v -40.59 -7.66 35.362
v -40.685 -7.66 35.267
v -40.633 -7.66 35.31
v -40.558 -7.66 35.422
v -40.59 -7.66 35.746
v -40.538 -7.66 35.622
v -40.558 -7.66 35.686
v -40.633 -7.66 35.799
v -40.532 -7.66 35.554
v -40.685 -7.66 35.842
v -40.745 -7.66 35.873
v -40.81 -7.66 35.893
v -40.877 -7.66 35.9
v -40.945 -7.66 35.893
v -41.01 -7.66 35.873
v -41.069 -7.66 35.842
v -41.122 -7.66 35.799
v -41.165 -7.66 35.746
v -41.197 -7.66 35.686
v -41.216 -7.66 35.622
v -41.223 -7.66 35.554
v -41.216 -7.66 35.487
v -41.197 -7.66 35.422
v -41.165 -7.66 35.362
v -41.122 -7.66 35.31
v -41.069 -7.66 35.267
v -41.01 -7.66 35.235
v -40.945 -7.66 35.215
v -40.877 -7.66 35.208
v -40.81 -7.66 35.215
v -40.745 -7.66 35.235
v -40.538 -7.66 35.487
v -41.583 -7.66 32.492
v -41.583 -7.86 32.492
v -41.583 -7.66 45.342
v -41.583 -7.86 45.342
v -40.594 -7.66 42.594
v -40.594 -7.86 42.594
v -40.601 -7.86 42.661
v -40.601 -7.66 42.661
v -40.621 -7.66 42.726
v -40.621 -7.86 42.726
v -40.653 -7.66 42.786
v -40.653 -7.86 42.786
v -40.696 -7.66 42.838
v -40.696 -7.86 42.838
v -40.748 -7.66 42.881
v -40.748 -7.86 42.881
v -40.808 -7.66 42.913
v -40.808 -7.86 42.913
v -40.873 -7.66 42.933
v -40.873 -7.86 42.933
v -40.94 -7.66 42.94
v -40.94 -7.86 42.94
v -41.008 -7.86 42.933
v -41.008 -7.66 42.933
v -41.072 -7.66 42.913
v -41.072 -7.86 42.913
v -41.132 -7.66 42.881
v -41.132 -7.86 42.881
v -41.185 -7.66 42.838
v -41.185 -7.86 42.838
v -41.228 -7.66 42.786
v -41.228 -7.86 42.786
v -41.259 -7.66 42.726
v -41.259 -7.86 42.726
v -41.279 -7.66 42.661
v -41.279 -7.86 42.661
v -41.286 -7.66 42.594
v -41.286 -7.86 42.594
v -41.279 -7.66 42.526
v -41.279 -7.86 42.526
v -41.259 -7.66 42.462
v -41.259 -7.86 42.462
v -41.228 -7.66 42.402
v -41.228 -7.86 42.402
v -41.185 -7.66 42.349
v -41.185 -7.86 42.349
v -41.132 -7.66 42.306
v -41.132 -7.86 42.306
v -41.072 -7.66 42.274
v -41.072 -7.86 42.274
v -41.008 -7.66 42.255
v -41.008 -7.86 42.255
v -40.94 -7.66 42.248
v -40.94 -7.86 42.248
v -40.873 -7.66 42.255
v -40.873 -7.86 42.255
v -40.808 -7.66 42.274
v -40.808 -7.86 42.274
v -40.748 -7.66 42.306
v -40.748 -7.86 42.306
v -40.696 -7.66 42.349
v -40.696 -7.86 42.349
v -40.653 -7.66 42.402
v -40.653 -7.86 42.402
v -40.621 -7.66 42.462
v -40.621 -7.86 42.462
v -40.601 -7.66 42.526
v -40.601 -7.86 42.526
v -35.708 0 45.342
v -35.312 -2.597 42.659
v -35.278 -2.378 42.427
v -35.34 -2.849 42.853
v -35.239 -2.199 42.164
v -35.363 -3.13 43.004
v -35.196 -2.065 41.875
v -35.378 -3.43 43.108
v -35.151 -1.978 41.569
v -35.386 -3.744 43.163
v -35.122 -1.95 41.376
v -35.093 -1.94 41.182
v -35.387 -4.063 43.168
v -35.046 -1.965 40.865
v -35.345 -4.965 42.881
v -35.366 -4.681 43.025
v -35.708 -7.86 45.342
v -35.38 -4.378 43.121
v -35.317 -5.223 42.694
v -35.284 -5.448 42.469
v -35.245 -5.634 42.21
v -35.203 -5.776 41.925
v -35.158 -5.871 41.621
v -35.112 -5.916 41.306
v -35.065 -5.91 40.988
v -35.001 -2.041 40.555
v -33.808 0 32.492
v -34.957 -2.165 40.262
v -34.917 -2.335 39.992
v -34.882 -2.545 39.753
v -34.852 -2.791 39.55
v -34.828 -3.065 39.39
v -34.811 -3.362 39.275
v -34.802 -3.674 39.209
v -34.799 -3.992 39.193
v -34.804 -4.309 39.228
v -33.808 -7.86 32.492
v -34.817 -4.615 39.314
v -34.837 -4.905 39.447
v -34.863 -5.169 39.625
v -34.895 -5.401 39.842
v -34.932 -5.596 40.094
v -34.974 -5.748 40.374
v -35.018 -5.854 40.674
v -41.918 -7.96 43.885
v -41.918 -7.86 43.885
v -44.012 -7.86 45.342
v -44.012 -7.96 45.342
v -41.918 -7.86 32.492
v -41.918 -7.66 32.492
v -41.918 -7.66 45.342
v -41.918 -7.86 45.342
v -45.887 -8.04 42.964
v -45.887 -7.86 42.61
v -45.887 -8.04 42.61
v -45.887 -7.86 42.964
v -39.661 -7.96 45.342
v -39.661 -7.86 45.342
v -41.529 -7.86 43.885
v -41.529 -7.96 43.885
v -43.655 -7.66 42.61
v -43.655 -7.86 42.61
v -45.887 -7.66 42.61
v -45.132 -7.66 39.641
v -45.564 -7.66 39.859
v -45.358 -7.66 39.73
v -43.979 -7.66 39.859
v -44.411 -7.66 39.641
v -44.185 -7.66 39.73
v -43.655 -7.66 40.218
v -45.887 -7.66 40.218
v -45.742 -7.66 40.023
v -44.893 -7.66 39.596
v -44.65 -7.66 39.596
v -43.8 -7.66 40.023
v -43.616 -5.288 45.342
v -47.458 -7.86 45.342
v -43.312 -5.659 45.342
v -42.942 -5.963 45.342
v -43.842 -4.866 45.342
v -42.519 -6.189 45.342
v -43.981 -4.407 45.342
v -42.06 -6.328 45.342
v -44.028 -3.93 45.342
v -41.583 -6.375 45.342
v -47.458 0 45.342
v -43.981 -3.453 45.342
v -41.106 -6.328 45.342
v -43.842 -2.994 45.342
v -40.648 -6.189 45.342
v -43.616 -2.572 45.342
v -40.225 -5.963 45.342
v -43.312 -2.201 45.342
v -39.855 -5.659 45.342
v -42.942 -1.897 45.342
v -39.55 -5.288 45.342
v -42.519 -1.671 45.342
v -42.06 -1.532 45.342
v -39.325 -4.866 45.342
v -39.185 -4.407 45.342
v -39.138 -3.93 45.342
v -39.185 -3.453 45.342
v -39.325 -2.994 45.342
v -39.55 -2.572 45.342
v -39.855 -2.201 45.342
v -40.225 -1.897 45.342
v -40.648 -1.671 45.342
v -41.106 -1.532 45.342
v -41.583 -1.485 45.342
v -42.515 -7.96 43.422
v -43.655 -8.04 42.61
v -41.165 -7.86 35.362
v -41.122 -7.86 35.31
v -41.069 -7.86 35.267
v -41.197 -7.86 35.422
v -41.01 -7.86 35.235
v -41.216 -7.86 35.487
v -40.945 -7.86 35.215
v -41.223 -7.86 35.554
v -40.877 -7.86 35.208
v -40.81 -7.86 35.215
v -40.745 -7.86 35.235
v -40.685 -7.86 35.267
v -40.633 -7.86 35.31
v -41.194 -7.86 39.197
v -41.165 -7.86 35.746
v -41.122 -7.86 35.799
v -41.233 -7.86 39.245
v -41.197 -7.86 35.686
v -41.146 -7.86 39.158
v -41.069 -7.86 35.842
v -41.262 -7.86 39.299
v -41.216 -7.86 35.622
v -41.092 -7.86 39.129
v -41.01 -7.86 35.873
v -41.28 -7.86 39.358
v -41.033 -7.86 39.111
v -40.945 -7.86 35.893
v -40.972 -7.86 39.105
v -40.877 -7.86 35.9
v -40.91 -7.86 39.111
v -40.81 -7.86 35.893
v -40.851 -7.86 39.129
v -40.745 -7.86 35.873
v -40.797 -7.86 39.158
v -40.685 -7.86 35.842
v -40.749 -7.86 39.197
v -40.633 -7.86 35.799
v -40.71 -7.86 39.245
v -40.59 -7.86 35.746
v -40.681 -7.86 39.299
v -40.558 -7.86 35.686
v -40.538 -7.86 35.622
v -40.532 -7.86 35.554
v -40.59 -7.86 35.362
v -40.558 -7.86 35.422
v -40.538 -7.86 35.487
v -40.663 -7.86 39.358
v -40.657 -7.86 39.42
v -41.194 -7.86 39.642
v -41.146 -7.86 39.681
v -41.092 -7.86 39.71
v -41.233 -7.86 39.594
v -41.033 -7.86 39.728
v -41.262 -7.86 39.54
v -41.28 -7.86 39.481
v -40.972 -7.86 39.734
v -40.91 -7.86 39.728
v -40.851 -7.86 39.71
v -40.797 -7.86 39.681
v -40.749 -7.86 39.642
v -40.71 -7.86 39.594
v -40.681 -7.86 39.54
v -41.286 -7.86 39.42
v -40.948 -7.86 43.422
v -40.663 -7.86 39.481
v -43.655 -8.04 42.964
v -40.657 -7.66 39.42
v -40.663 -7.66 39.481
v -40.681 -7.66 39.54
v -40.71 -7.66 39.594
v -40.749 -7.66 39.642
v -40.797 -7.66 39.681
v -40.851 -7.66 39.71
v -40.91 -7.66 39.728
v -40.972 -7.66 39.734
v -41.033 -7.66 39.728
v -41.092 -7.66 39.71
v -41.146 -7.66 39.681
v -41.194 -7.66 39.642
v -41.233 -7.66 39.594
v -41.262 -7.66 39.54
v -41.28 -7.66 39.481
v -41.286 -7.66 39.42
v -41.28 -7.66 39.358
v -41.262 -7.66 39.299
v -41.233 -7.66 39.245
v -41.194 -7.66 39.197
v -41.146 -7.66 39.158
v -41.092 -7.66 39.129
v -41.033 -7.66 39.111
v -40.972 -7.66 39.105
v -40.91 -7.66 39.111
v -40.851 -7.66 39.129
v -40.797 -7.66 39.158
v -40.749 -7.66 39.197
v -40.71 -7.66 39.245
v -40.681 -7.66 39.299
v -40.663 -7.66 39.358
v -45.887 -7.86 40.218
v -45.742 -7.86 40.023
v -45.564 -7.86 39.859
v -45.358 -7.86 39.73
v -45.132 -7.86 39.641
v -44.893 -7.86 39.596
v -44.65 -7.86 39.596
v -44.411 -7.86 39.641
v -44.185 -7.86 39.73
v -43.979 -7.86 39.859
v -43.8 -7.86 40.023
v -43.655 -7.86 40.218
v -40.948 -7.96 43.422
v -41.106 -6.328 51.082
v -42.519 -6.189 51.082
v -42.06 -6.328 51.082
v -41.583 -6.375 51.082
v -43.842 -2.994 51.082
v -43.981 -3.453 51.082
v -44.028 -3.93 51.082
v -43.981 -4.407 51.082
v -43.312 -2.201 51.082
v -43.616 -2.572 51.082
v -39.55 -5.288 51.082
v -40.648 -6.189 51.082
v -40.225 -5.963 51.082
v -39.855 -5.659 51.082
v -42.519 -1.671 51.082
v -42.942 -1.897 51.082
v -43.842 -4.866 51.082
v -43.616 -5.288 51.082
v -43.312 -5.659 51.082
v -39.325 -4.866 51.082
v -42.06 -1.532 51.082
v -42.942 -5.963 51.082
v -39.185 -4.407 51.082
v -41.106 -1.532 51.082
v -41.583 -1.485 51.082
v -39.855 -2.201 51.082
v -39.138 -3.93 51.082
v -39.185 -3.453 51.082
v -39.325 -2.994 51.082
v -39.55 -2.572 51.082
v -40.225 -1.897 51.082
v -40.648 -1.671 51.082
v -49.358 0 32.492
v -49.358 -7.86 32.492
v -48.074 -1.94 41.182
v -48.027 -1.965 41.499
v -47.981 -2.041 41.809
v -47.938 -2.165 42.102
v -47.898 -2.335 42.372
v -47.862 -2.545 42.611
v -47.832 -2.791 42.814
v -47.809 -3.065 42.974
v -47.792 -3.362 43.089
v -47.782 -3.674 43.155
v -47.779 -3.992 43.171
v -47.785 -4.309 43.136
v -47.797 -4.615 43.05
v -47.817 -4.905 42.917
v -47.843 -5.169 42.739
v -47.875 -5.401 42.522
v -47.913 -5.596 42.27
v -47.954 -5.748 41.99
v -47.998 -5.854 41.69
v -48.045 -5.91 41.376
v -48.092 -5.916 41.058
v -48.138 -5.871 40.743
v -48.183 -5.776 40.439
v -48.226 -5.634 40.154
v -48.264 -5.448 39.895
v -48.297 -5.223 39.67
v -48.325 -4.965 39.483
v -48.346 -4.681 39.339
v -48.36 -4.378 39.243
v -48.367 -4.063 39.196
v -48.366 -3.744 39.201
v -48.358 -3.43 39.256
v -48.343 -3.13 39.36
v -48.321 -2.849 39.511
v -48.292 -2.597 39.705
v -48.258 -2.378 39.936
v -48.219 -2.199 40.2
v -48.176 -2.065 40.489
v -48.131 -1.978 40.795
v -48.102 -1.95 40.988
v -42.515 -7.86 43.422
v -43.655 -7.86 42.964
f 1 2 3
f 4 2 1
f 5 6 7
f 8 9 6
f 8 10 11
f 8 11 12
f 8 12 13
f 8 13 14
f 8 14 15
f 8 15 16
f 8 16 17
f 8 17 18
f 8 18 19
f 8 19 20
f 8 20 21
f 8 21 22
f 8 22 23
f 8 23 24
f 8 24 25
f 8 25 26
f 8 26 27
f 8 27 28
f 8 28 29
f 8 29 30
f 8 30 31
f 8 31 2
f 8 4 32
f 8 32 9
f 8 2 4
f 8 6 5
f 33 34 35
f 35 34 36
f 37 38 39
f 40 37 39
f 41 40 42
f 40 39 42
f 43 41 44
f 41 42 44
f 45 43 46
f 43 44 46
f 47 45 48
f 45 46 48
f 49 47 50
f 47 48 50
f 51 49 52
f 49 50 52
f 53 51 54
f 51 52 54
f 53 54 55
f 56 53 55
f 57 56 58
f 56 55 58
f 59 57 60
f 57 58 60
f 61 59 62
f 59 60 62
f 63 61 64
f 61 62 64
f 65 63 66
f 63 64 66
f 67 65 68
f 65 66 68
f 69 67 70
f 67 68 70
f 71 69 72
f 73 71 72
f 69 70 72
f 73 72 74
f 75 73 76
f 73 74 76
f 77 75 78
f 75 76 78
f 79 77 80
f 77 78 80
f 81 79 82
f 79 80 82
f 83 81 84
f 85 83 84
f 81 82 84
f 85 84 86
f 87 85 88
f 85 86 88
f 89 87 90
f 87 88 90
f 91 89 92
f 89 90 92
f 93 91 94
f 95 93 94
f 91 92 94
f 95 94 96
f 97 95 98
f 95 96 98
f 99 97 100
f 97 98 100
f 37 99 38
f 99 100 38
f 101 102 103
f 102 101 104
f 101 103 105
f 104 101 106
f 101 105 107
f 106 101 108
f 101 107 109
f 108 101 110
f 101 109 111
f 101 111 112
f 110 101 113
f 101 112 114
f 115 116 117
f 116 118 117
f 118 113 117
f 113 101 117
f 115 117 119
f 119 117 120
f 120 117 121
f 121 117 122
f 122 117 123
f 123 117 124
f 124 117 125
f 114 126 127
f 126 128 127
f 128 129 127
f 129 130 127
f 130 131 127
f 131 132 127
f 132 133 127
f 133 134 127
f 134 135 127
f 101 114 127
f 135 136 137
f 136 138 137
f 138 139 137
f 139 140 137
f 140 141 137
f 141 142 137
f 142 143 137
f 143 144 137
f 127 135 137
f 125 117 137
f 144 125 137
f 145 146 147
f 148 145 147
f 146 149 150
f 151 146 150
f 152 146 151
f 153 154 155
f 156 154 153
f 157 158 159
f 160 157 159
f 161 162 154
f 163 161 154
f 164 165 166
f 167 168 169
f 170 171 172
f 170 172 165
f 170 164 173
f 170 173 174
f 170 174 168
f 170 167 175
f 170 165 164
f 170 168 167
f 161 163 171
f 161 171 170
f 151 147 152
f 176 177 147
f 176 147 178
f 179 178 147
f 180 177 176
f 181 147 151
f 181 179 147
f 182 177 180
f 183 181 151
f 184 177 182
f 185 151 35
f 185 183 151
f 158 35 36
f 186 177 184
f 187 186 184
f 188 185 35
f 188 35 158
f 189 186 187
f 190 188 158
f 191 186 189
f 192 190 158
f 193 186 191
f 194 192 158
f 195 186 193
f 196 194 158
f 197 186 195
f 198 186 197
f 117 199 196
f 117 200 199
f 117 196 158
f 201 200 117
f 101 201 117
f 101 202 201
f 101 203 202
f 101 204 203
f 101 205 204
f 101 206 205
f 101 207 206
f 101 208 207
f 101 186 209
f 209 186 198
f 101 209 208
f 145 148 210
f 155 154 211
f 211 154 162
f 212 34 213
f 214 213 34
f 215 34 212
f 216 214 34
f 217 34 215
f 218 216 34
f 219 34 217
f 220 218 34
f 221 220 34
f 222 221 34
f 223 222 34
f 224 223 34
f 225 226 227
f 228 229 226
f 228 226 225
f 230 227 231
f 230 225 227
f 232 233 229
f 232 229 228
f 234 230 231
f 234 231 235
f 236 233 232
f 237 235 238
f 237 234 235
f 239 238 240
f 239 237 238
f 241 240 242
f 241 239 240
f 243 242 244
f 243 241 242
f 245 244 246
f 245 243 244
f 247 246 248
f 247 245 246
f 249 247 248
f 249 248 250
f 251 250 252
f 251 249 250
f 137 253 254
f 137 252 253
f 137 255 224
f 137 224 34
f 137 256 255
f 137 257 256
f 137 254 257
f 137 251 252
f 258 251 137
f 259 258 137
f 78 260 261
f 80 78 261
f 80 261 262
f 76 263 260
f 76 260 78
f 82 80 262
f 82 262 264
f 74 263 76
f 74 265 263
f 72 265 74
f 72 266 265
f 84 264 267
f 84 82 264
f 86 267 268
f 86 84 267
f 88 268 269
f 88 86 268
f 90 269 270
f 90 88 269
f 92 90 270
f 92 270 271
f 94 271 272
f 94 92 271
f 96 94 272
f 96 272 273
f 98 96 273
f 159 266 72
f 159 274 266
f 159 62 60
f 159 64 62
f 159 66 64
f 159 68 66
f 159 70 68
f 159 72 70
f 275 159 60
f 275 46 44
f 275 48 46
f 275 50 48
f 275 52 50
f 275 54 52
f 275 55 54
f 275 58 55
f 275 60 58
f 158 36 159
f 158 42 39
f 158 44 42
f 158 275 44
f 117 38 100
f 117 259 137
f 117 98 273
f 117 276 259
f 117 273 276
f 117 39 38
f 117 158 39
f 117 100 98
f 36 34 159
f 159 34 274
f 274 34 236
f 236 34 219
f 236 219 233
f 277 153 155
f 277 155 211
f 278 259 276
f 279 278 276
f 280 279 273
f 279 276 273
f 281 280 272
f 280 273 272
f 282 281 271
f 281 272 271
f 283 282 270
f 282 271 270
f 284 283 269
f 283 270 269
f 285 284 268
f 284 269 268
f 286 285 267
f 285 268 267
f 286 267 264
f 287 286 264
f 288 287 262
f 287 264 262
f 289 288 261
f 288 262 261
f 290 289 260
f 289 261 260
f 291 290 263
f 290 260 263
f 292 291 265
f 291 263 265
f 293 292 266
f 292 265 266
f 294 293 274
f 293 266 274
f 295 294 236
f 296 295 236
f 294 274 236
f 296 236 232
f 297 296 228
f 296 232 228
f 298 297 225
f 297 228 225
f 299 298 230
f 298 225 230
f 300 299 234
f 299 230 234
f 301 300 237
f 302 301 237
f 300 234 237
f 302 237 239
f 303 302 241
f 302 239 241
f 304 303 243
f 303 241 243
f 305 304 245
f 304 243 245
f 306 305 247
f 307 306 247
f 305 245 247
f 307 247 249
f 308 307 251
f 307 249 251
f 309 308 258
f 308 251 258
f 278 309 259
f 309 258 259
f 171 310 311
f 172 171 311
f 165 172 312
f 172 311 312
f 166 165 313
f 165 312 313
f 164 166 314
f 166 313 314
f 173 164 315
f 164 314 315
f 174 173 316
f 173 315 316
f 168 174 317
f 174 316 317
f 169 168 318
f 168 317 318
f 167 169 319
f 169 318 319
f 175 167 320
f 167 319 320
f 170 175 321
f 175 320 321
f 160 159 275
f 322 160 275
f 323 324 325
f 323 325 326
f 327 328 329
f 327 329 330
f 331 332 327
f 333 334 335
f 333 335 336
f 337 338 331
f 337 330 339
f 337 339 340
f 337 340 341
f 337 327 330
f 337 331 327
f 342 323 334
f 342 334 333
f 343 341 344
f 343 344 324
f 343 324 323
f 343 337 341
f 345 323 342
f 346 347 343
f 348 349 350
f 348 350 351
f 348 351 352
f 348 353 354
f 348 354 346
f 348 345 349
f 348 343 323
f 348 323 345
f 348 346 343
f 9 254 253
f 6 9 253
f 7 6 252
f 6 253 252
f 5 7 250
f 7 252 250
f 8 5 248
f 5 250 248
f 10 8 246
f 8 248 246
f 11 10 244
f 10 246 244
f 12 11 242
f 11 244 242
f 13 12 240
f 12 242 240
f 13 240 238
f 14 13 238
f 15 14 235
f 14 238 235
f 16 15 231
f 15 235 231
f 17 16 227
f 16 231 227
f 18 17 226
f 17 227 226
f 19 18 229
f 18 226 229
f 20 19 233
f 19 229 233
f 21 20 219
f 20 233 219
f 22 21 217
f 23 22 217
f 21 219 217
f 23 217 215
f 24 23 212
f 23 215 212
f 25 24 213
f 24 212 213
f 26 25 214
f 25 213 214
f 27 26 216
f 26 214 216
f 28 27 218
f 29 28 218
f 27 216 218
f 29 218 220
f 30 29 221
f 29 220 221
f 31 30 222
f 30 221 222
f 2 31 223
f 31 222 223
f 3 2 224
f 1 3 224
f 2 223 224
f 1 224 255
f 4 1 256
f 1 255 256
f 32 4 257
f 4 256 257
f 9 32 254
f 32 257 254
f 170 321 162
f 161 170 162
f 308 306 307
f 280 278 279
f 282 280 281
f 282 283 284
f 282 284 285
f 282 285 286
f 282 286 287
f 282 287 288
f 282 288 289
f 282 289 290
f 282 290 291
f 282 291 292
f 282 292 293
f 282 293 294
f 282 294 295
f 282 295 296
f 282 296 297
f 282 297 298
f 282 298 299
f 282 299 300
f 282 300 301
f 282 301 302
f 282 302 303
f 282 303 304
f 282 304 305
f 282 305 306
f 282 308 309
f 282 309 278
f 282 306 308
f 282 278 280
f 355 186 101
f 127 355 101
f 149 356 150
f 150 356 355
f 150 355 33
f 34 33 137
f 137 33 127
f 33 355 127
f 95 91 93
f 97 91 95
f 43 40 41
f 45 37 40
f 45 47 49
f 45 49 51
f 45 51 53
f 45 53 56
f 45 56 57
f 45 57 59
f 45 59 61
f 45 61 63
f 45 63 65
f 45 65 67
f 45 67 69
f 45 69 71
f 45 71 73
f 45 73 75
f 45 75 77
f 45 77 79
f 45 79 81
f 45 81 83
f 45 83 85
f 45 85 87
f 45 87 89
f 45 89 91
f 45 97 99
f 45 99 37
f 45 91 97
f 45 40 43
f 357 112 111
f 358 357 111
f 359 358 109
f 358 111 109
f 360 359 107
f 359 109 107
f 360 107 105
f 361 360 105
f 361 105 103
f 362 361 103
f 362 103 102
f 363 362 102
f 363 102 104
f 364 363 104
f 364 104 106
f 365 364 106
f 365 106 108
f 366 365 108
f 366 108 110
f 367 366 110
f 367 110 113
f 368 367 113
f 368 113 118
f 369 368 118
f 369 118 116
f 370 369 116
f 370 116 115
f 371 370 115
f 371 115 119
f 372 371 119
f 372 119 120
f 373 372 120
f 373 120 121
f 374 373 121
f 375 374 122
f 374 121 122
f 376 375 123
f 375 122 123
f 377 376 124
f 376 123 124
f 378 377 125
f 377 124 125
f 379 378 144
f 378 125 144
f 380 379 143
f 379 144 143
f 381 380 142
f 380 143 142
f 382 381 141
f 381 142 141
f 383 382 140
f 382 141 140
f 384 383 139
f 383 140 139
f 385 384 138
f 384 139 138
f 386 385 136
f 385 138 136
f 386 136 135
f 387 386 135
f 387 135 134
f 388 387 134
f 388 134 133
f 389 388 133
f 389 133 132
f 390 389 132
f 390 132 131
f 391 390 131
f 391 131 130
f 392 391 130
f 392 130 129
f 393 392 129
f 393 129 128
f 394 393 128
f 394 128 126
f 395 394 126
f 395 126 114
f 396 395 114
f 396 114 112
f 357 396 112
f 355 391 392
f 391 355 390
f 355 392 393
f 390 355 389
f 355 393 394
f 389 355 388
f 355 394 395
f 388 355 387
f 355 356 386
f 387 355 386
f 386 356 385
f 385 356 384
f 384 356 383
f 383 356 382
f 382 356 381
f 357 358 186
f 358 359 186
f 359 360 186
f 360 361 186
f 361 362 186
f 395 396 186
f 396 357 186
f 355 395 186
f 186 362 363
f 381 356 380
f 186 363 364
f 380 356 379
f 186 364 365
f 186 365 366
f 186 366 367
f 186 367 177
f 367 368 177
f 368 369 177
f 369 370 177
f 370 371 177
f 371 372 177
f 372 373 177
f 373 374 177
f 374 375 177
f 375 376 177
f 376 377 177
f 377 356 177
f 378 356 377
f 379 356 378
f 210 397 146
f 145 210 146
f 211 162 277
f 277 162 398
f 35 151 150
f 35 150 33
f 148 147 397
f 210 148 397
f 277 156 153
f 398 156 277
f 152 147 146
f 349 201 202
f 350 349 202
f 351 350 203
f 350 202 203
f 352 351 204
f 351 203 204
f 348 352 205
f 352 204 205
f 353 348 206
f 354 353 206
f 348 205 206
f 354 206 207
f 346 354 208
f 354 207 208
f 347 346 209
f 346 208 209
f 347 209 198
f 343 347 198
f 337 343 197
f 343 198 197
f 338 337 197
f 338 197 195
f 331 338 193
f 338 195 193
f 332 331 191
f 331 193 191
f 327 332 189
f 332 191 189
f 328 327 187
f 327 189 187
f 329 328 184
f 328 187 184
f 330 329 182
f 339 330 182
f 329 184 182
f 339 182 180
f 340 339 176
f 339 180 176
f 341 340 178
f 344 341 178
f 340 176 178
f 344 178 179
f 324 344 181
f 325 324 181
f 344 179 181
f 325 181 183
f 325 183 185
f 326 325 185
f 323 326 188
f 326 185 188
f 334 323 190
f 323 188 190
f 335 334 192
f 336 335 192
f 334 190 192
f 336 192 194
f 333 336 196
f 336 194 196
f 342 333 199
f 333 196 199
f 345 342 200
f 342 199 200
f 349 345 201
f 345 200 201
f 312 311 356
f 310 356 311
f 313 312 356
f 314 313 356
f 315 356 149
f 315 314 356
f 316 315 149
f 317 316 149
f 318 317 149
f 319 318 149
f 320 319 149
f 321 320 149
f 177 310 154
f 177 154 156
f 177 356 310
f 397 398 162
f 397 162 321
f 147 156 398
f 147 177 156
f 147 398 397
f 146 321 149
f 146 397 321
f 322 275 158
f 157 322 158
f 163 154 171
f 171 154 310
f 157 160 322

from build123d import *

# Parameters (mm, degrees)
F0_W      = 15.55
F0_H      = 12.85
F1_DEPTH  = 7.86
F2_R      = 2.445
F3_DEPTH  = 5.74
F4_R      = 1.99
F5_DEPTH  = 25
F7_DEPTH  = 25
F8_R      = 0.314277
F8_R_2    = 0.345703
F9_DEPTH  = 0.2
F8_W      = 0.334352
F8_H      = 12.85
F10_DEPTH = 0.2
F12_DEPTH = 0.1
F13_W     = 2.232052
F13_H     = 0.354293
F14_DEPTH = 0.18
F15_DEPTH = 0.2


with BuildPart() as f1:
    # F0 (on Front) → F1 (new body)
    with BuildSketch(Plane.XZ):
        with Locations((-41.583441, 38.916974)):
            Rectangle(F0_W, F0_H)
    extrude(amount=F1_DEPTH)

    # F2 (on face) → F3 (join)
    with BuildSketch(Plane.XY.offset(45.341974)):
        with Locations((-41.583441, -3.93)):
            Circle(F2_R)
    extrude(amount=F3_DEPTH)

    # F4 (on face) → F5 (cut)
    with BuildSketch(Plane.YZ.offset(-33.808441)):
        with Locations((-3.93, 41.181974)):
            Circle(F4_R)
    extrude(amount=-F5_DEPTH, mode=Mode.SUBTRACT)

    # F6 (on face) → F7 (cut)
    with BuildSketch(Plane.XZ.offset(7.86)):
        Polygon((-49.358441, 45.341974), (-49.358441, 32.491974), (-47.458441, 45.341974), align=None)
        Polygon((-35.708441, 45.341974), (-33.808441, 32.491974), (-33.808441, 45.341974), align=None)
    extrude(amount=-F7_DEPTH, mode=Mode.SUBTRACT)

    # F8 (on face) → F9 (cut)
    with BuildSketch(Plane.XZ.offset(7.86)):
        with Locations((-40.971532, 39.419685)):
            Circle(F8_R)
        with Locations((-40.940102, 42.593867)):
            Circle(F8_R_2)
        with Locations((-40.877249, 35.554096)):
            Circle(F8_R_2)
    extrude(amount=-F9_DEPTH, mode=Mode.SUBTRACT)

    # F8 (on face) → F10 (cut)
    with BuildSketch(Plane.XZ.offset(7.86)):
        with Locations((-40.940102, 42.593867)):
            Circle(F8_R_2)
        with Locations((-40.971532, 39.419685)):
            Circle(F8_R)
        with Locations((-40.877249, 35.554096)):
            Circle(F8_R_2)
        with Locations((-41.750617, 38.916974)):
            Rectangle(F8_W, F8_H)
    extrude(amount=-F10_DEPTH, mode=Mode.SUBTRACT)

    # F11 (on face) → F12 (join)
    with BuildSketch(Plane.XZ.offset(7.86)):
        Polygon((-42.515382, 43.422379), (-41.917793, 43.885078), (-44.012314, 45.341974), align=None)
        Polygon((-39.660979, 45.341974), (-41.529234, 43.885078), (-40.948099, 43.422379), align=None)
    extrude(amount=F12_DEPTH)

    # F13 (on face) → F14 (join)
    with BuildSketch(Plane.XZ.offset(7.86)):
        with Locations((-44.771414, 42.786905)):
            Rectangle(F13_W, F13_H)
    extrude(amount=F14_DEPTH)

    # F13 (on face) → F15 (cut)
    with BuildSketch(Plane.XZ.offset(7.86)):
        with BuildLine():
            Line((-43.655388, 42.609759), (-45.88744, 42.609759))
            Line((-45.88744, 42.609759), (-45.88744, 40.218275))
            ThreePointArc((-45.88744, 40.218275), (-44.771414, 39.590548), (-43.655388, 40.218275))
            Line((-43.655388, 40.218275), (-43.655388, 42.609759))
        make_face()
    extrude(amount=-F15_DEPTH, mode=Mode.SUBTRACT)


solid = f1.part
